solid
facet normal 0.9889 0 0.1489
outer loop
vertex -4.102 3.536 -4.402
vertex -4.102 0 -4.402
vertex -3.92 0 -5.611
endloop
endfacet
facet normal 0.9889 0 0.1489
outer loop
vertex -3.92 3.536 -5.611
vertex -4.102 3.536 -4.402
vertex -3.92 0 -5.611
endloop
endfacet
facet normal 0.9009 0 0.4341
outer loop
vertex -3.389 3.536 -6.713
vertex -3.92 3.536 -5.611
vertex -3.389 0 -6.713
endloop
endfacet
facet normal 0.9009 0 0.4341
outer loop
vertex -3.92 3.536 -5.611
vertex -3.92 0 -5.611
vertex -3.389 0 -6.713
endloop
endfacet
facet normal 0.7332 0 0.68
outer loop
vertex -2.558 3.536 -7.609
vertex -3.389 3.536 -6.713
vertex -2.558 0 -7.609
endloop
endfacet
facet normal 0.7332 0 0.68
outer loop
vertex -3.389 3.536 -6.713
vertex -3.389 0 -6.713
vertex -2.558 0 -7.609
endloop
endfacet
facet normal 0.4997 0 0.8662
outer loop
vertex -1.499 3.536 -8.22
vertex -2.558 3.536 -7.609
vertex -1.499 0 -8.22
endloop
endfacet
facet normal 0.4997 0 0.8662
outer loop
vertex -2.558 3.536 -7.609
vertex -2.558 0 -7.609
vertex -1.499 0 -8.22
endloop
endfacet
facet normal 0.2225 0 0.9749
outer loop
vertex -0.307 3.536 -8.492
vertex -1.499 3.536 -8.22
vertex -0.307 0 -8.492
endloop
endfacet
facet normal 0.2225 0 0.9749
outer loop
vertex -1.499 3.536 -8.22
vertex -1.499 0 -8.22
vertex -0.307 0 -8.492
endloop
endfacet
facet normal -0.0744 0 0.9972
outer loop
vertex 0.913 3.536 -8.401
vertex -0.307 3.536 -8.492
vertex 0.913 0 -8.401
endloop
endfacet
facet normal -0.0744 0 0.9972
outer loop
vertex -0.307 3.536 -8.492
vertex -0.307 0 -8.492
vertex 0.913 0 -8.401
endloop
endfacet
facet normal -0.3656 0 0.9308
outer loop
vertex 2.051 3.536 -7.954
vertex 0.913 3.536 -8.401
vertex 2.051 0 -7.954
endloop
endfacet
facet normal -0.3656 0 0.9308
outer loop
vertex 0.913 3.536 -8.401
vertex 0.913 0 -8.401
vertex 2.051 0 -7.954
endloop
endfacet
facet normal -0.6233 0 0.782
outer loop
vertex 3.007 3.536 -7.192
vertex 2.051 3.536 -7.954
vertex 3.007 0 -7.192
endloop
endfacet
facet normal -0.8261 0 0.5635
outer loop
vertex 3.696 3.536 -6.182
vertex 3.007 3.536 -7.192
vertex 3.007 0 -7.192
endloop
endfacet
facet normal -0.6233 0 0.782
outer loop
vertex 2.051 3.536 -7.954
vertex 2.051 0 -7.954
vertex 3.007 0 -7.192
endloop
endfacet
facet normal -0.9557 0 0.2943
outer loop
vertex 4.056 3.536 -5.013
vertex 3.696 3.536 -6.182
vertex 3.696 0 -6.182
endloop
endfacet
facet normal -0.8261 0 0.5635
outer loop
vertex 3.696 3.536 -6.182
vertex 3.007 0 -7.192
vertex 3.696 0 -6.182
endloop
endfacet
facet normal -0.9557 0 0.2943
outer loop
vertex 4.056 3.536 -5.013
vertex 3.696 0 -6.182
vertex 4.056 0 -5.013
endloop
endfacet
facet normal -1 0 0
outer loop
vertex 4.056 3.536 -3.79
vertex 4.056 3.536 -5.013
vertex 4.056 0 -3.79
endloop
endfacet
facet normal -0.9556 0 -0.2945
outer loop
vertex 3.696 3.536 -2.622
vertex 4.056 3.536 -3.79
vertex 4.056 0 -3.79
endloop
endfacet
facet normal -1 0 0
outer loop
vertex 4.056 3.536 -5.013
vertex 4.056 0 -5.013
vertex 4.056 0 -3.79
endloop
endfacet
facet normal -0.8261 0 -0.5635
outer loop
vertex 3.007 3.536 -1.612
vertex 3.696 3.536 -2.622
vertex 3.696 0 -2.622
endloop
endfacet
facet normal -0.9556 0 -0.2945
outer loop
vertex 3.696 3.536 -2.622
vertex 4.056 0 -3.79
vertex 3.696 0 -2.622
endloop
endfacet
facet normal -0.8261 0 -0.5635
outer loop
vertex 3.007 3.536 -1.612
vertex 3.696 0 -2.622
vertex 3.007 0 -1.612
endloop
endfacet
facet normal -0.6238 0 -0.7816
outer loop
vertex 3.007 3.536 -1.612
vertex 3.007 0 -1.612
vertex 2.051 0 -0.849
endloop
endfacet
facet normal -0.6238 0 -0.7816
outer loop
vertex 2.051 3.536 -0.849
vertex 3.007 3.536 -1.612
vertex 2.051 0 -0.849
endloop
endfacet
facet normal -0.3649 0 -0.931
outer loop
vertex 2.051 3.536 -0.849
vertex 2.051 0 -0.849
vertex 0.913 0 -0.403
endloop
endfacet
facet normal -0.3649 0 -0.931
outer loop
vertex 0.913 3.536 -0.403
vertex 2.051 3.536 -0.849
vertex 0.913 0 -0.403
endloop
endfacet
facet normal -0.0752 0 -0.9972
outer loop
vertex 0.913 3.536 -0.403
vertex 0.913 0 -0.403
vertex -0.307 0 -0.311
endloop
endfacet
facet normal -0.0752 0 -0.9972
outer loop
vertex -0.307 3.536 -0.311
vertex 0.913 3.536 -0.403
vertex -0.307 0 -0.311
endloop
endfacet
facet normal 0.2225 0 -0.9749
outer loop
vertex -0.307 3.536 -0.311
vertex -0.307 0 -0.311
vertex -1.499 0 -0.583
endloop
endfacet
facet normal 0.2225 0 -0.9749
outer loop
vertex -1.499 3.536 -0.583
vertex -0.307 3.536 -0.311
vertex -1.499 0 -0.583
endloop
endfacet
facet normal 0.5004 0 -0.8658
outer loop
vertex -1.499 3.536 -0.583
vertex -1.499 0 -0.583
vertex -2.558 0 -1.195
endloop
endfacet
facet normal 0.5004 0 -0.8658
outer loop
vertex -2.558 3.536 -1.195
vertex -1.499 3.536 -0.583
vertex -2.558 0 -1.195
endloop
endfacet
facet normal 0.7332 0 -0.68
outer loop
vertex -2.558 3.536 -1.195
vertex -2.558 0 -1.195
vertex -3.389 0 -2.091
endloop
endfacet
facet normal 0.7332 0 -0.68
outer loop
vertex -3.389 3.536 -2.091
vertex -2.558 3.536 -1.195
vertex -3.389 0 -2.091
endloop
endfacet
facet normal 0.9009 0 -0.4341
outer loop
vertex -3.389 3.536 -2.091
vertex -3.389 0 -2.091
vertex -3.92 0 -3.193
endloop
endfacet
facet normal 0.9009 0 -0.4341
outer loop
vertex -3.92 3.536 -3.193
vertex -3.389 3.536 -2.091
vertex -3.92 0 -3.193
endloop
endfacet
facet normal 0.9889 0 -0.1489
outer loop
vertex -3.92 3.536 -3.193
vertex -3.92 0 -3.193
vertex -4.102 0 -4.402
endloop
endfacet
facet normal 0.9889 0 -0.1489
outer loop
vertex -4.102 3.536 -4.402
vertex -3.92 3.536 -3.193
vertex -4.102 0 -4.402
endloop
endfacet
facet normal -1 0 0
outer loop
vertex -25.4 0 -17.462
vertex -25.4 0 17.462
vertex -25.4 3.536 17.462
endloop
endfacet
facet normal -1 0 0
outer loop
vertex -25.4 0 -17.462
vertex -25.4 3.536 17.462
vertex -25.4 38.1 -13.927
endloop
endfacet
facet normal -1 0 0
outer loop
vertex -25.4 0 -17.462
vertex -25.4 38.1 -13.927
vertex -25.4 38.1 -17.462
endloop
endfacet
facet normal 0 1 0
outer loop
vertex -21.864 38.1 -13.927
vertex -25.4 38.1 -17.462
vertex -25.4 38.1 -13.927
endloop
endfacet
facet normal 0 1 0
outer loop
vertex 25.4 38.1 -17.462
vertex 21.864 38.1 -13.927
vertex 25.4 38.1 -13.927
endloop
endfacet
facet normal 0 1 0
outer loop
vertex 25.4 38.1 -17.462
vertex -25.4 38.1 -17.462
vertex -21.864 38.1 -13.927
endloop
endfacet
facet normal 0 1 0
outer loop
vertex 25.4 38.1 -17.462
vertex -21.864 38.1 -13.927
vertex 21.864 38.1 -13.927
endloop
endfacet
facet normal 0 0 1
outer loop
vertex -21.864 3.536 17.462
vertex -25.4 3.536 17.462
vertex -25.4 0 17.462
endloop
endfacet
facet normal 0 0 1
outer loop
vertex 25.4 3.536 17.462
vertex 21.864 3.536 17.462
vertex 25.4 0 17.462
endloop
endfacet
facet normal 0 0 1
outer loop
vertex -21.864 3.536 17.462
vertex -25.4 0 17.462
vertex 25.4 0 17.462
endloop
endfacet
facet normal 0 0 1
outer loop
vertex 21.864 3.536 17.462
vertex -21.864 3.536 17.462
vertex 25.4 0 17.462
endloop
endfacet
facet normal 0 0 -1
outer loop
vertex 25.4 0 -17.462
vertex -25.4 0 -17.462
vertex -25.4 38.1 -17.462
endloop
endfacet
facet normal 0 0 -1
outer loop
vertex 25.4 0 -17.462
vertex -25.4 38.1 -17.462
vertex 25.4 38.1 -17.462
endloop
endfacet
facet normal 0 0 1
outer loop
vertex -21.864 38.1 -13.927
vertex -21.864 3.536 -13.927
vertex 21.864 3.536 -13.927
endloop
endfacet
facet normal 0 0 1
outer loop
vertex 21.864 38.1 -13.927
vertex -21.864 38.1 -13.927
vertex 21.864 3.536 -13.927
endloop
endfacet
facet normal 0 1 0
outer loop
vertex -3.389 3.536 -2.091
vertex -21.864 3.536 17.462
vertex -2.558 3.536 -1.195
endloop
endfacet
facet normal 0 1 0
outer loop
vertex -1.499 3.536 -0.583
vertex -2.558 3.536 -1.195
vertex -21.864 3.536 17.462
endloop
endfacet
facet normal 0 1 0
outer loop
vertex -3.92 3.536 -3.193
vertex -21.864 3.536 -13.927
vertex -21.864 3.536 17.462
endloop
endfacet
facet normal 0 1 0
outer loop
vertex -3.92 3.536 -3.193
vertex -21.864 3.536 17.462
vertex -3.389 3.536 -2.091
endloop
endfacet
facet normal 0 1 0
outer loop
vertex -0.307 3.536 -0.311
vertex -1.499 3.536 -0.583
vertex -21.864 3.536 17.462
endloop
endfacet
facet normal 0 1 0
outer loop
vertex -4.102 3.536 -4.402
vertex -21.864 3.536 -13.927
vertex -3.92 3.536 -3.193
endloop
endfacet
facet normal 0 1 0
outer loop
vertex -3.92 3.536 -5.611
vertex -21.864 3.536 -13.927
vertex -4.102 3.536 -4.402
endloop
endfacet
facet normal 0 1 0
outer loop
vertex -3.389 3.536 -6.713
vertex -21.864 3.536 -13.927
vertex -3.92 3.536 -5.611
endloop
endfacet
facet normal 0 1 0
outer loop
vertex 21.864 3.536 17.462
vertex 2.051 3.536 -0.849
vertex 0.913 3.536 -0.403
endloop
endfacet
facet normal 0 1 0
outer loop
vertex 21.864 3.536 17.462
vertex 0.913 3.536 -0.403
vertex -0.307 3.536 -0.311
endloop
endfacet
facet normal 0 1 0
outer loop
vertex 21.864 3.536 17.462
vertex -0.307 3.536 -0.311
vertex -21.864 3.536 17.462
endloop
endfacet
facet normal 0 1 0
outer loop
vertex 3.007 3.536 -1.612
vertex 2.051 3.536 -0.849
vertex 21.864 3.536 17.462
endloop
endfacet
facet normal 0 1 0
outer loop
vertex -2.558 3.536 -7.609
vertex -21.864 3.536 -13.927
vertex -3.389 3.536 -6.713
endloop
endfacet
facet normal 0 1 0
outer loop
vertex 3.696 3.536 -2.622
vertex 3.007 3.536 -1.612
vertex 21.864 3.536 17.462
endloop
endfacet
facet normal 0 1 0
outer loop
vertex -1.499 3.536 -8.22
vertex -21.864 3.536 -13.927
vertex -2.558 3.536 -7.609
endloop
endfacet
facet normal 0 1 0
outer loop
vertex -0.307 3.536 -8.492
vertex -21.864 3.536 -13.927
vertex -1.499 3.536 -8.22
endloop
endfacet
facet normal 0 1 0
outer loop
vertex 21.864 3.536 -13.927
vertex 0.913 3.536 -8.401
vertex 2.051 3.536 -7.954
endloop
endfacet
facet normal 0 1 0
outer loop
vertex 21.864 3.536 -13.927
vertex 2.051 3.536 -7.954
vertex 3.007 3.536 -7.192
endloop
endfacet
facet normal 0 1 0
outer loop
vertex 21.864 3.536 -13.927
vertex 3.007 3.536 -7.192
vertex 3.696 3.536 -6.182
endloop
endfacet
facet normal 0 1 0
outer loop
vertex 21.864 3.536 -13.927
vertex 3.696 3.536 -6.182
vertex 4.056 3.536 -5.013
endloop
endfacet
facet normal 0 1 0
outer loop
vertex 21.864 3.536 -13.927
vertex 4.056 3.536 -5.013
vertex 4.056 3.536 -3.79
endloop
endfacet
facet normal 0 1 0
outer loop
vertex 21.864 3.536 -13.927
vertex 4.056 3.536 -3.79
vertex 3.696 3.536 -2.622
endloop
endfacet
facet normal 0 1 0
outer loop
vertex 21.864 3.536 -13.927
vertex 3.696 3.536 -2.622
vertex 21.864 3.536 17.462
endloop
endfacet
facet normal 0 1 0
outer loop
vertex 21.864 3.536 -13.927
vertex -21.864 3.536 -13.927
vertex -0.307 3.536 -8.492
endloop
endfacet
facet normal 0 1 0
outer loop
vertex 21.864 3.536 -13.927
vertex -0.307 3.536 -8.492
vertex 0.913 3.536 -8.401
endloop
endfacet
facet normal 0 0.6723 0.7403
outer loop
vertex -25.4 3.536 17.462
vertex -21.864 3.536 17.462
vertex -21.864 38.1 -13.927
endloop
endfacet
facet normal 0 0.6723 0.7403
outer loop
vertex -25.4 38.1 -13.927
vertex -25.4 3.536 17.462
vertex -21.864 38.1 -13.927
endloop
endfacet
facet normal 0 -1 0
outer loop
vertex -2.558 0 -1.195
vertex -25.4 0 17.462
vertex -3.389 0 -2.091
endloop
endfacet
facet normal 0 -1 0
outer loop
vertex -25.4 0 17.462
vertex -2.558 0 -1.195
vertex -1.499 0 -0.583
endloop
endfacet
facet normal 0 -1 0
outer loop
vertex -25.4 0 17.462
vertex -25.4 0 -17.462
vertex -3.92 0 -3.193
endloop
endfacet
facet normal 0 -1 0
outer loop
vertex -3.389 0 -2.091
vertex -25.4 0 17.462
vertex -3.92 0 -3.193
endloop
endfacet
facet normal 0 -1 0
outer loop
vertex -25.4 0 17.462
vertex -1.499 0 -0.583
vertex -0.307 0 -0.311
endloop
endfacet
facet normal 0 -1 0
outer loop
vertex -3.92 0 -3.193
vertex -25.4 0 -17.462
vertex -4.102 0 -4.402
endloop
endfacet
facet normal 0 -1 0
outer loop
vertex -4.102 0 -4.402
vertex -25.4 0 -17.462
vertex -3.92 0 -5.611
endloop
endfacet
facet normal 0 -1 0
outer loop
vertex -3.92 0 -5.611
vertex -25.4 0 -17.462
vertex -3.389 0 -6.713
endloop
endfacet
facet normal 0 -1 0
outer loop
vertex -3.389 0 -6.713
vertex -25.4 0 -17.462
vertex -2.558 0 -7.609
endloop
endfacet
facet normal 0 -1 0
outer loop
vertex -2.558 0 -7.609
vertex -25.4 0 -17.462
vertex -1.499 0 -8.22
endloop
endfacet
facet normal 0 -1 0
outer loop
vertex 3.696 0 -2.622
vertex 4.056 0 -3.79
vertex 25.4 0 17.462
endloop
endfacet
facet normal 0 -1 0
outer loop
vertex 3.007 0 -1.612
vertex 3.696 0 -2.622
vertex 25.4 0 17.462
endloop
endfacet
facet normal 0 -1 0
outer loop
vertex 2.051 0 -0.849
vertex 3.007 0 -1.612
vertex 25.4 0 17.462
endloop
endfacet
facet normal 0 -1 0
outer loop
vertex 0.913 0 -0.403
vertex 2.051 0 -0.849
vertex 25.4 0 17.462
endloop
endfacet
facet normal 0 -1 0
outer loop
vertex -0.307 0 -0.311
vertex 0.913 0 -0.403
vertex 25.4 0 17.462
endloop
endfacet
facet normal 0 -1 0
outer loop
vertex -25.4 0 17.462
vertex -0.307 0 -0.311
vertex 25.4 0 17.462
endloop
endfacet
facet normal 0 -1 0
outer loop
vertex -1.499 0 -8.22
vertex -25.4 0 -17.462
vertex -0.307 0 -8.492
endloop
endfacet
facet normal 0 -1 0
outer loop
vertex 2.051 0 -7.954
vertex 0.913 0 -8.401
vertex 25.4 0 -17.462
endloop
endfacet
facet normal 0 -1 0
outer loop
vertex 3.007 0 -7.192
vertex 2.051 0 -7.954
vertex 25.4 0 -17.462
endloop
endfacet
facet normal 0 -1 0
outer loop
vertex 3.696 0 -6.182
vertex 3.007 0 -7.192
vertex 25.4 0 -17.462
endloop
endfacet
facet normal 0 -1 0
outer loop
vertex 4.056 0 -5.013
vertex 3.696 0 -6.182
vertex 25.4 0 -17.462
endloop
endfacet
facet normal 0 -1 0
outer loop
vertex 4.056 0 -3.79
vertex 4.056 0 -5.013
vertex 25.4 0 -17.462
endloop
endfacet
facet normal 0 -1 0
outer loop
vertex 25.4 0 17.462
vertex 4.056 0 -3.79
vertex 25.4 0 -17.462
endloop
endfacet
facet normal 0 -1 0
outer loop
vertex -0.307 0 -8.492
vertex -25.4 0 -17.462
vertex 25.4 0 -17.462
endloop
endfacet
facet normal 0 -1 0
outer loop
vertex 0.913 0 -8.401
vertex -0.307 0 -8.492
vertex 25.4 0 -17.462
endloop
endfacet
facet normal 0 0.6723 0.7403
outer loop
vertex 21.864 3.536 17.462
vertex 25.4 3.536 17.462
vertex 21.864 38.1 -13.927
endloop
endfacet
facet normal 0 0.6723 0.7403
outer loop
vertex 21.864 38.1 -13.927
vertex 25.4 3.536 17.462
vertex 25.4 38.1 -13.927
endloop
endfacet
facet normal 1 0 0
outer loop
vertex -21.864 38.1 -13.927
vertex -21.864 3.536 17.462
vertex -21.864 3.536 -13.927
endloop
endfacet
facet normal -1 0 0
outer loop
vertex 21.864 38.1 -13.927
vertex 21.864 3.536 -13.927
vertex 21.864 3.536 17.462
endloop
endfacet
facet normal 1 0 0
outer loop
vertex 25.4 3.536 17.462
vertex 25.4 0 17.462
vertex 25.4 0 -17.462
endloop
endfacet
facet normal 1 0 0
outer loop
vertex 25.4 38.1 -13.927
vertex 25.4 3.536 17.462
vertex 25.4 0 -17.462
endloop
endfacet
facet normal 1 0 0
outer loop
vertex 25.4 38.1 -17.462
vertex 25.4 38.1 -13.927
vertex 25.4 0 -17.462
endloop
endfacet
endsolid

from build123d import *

# Parameters (mm, degrees)
SKETCH1_W                = 50.8
SKETCH1_H                = 34.925
BOSS_EXTRUDE1_DEPTH      = 3.53568
BOSS_EXTRUDE2_START      = -3.53568
BOSS_EXTRUDE2_DEPTH      = 38.1
CUT_EXTRUDE1_DEPTH       = 66.857337528
F_5_16_CLEARANCE_HOLE1_D = 8.2042


with BuildPart() as part:
    # Sketch1 → Boss-Extrude1 (new body)
    with BuildSketch(Plane(origin=(0, 0, 0), x_dir=(1, 0, 0), z_dir=(0, 1, 0))):
        Rectangle(SKETCH1_W, SKETCH1_H)
    extrude(amount=BOSS_EXTRUDE1_DEPTH)

    # Sketch2 → Boss-Extrude2 (add)
    with BuildSketch(Plane(origin=(0, 3.53568, 0), x_dir=(1, 0, 0), z_dir=(0, 1, 0)).offset(BOSS_EXTRUDE2_START)):
        Polygon((21.86432, -17.4625), (25.4, -17.4625), (25.4, 17.4625), (-25.4, 17.4625), (-25.4, -17.4625), (-21.86432, -17.4625), (-21.86432, 13.92682), (21.86432, 13.92682), align=None)
    extrude(amount=BOSS_EXTRUDE2_DEPTH)

    # Sketch3 → Cut-Extrude1 (cut, through all)
    with BuildSketch(Plane(origin=(25.4, 0, 0), x_dir=(0, 0, -1), z_dir=(1, 0, 0))):
        Polygon((-17.4625, 3.53568), (13.92682, 38.1), (-17.4625, 38.1), align=None)
    extrude(amount=-CUT_EXTRUDE1_DEPTH, mode=Mode.SUBTRACT)

    # 5/16 Clearance Hole1 (through all)
    with Locations(Plane(origin=(0, 3.53568, 0), x_dir=(1, 0, 0), z_dir=(0, 1, 0))):
        with Locations((0, 4.40182)):
            Hole(F_5_16_CLEARANCE_HOLE1_D / 2)


solid = part.part
